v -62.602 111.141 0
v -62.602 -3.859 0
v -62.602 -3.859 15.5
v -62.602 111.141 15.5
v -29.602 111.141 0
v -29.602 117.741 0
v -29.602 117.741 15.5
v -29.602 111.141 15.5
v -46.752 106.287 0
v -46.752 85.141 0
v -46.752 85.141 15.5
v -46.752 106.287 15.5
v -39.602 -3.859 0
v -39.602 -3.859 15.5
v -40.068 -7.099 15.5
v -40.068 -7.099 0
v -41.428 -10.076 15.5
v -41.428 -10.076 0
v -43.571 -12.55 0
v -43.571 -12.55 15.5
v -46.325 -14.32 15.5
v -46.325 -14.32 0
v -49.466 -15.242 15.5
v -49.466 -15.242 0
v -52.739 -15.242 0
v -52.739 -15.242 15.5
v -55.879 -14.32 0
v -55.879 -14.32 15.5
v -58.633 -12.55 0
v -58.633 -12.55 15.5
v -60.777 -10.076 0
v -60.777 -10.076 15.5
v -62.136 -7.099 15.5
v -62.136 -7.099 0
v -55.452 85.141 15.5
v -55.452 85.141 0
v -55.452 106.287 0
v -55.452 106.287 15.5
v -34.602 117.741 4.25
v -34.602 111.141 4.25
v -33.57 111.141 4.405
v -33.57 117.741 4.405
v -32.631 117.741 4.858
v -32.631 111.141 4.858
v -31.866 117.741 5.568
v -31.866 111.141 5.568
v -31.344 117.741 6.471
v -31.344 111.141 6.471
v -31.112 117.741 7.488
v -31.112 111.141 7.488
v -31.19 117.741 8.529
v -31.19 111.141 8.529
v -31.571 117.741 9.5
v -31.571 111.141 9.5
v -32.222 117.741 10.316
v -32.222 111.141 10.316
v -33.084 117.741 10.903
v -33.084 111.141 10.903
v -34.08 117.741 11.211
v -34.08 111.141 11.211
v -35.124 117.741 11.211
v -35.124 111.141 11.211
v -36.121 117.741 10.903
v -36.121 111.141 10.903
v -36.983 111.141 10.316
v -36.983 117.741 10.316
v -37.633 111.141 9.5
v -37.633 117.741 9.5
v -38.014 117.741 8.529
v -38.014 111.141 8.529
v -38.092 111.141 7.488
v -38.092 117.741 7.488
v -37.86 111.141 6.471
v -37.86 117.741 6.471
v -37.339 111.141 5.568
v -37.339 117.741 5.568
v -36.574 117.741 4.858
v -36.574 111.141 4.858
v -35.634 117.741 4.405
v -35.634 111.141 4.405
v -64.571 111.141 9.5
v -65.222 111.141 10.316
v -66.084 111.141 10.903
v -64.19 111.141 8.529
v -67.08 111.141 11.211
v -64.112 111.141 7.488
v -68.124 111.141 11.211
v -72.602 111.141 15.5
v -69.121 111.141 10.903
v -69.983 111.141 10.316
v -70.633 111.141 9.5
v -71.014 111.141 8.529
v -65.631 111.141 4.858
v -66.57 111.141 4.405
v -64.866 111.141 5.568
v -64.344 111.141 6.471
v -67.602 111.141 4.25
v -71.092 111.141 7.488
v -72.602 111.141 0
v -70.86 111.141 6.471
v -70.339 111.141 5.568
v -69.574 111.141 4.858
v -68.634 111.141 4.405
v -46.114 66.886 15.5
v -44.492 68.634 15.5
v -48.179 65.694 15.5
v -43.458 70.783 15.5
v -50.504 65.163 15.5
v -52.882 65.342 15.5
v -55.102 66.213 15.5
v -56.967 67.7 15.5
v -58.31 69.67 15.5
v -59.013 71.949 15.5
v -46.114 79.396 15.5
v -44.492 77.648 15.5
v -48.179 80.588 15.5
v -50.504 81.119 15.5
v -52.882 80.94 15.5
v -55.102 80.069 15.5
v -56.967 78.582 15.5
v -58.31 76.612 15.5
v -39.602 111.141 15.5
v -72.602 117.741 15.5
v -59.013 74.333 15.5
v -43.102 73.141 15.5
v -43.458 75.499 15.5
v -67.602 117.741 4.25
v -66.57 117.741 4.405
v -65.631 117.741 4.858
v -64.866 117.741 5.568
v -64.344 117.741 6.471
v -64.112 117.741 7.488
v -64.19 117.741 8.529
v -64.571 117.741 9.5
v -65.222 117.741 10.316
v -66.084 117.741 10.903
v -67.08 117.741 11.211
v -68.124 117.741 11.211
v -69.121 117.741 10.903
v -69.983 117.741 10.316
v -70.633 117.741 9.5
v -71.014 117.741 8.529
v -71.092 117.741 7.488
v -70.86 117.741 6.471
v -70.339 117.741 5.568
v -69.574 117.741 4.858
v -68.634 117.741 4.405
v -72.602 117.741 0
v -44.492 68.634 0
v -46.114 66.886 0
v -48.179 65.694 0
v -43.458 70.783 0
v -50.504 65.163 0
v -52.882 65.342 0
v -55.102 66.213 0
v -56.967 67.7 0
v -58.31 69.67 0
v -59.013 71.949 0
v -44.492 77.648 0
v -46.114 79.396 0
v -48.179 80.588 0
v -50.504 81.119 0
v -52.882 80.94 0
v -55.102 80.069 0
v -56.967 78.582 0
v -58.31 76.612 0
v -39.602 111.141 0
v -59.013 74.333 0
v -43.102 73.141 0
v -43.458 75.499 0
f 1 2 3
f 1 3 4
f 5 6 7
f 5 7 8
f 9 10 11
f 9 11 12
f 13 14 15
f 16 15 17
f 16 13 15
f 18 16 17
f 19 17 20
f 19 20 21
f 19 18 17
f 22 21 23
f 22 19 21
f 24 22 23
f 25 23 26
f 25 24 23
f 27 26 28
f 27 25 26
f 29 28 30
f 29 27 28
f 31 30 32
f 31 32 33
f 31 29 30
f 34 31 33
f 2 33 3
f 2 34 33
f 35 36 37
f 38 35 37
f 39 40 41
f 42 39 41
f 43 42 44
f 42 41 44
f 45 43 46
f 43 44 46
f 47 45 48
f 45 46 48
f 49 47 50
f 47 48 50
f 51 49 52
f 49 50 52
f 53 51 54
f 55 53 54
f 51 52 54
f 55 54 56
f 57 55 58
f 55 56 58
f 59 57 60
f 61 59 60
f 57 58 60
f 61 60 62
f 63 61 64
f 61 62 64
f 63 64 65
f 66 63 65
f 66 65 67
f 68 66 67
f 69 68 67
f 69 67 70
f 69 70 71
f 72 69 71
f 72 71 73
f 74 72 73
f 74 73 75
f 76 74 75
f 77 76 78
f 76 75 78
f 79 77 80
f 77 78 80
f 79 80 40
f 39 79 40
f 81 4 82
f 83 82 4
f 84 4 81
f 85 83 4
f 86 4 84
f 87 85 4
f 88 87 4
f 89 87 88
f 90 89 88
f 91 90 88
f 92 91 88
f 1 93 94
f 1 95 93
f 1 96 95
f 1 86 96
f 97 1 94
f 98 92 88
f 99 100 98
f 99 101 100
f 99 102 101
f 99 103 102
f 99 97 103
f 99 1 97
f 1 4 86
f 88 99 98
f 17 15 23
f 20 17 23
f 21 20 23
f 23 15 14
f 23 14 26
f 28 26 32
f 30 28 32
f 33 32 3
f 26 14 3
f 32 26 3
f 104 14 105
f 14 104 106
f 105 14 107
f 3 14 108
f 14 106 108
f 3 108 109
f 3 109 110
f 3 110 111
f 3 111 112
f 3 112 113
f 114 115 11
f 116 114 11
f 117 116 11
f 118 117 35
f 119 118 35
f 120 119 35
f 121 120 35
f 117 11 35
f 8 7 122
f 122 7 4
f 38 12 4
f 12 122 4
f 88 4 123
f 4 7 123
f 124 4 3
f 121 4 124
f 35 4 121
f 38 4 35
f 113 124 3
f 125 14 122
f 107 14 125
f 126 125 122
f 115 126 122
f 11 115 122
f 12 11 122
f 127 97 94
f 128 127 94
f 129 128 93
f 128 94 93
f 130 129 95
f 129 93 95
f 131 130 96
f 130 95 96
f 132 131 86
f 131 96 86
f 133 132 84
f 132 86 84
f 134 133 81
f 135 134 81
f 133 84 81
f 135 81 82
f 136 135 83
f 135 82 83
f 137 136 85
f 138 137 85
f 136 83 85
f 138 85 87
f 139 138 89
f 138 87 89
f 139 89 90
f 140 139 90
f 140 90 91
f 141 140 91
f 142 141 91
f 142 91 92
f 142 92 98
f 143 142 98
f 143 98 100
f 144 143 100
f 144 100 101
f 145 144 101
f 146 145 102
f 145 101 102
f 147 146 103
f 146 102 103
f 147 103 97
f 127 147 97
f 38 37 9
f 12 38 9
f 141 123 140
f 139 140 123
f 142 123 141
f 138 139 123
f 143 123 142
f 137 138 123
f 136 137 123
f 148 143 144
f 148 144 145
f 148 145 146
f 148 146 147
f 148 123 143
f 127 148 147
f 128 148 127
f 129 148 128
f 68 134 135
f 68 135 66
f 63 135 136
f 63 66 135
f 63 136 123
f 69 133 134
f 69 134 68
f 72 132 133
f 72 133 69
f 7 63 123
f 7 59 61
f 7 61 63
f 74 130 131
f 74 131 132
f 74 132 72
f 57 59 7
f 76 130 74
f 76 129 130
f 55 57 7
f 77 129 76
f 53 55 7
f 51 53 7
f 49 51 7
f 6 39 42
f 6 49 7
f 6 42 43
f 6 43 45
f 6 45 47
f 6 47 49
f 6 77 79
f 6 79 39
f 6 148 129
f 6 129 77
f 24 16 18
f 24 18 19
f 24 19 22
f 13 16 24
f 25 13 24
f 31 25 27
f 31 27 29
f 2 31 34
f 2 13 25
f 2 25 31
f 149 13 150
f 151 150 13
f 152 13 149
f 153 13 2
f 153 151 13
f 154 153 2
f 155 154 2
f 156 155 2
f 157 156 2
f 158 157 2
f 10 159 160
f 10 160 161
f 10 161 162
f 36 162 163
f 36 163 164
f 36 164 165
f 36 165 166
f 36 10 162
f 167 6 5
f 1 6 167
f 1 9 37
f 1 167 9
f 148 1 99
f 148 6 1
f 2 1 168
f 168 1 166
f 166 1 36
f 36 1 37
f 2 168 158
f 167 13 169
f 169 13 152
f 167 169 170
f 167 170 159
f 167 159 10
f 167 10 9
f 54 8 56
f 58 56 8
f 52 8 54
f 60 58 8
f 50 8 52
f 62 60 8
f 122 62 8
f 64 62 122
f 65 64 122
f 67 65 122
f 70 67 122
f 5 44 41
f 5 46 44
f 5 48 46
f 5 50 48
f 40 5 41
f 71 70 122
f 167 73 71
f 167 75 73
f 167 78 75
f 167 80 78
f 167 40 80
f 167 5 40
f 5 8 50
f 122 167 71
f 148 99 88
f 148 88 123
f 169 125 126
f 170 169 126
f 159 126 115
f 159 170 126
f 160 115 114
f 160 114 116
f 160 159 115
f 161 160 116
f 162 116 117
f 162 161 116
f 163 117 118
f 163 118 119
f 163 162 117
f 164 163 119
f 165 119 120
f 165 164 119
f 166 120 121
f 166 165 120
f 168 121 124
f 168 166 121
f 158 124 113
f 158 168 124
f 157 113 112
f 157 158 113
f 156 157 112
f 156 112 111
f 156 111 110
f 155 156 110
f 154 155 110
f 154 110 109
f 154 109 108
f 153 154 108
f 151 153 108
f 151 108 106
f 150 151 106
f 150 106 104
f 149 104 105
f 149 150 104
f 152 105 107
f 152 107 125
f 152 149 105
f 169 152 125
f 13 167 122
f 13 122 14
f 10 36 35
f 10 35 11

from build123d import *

# Parameters (mm, degrees)
ESTRUSIONE_ESTRUSIONE3_DEPTH = 15.5
SCHIZZO6_R                   = 8
TAGLIO_ESTRUSIONE1_DEPTH     = 15.5
SCHIZZO7_W                   = 8.7
SCHIZZO7_H                   = 21.146442976
TAGLIO_ESTRUSIONE2_DEPTH     = 15.5
SCHIZZO14_R                  = 3.5
TAGLIO_ESTRUSIONE3_DEPTH     = 6.6
SCHIZZO15_R                  = 3.5
TAGLIO_ESTRUSIONE4_DEPTH     = 6.6


with BuildPart() as part:
    # Schizzo3 → Estrusione-Estrusione3 (new body)
    with BuildSketch(Plane.XY):
        with BuildLine():
            Line((-62.60213075, -3.859058403), (-62.60213075, 111.140941597))
            Line((-62.60213075, 111.140941597), (-72.60213075, 111.140941597))
            Line((-72.60213075, 111.140941597), (-72.60213075, 117.740941597))
            Line((-72.60213075, 117.740941597), (-29.60213075, 117.740941597))
            Line((-29.60213075, 117.740941597), (-29.60213075, 111.140941597))
            Line((-29.60213075, 111.140941597), (-39.60213075, 111.140941597))
            Line((-39.60213075, 111.140941597), (-39.60213075, -3.859058403))
            ThreePointArc((-39.60213075, -3.859058403), (-51.10213075, -15.359058403), (-62.60213075, -3.859058403))
        make_face()
    extrude(amount=ESTRUSIONE_ESTRUSIONE3_DEPTH)

    # Schizzo6 → Taglio-Estrusione1 (cut)
    with BuildSketch(Plane.XY):
        with Locations((-51.10213075, 73.140941597)):
            Circle(SCHIZZO6_R)
    extrude(amount=TAGLIO_ESTRUSIONE1_DEPTH, mode=Mode.SUBTRACT)

    # Schizzo7 → Taglio-Estrusione2 (cut)
    with BuildSketch(Plane.XY):
        with Locations((-51.10213075, 95.714163085)):
            Rectangle(SCHIZZO7_W, SCHIZZO7_H)
    extrude(amount=TAGLIO_ESTRUSIONE2_DEPTH, mode=Mode.SUBTRACT)

    # Schizzo14 → Taglio-Estrusione3 (cut)
    with BuildSketch(Plane(origin=(0, 111.140941597, 0), x_dir=(-1, 0, 0), z_dir=(0, -1, 0))):
        with Locations(Location((34.60213075, -7.75, 0), (0, 0, 90))):
            Circle(SCHIZZO14_R)
    extrude(amount=-TAGLIO_ESTRUSIONE3_DEPTH, mode=Mode.SUBTRACT)

    # Schizzo15 → Taglio-Estrusione4 (cut)
    with BuildSketch(Plane(origin=(0, 111.140941597, 0), x_dir=(-1, 0, 0), z_dir=(0, -1, 0))):
        with Locations(Location((67.60213075, -7.75, 0), (0, 0, 90))):
            Circle(SCHIZZO15_R)
    extrude(amount=-TAGLIO_ESTRUSIONE4_DEPTH, mode=Mode.SUBTRACT)


solid = part.part
